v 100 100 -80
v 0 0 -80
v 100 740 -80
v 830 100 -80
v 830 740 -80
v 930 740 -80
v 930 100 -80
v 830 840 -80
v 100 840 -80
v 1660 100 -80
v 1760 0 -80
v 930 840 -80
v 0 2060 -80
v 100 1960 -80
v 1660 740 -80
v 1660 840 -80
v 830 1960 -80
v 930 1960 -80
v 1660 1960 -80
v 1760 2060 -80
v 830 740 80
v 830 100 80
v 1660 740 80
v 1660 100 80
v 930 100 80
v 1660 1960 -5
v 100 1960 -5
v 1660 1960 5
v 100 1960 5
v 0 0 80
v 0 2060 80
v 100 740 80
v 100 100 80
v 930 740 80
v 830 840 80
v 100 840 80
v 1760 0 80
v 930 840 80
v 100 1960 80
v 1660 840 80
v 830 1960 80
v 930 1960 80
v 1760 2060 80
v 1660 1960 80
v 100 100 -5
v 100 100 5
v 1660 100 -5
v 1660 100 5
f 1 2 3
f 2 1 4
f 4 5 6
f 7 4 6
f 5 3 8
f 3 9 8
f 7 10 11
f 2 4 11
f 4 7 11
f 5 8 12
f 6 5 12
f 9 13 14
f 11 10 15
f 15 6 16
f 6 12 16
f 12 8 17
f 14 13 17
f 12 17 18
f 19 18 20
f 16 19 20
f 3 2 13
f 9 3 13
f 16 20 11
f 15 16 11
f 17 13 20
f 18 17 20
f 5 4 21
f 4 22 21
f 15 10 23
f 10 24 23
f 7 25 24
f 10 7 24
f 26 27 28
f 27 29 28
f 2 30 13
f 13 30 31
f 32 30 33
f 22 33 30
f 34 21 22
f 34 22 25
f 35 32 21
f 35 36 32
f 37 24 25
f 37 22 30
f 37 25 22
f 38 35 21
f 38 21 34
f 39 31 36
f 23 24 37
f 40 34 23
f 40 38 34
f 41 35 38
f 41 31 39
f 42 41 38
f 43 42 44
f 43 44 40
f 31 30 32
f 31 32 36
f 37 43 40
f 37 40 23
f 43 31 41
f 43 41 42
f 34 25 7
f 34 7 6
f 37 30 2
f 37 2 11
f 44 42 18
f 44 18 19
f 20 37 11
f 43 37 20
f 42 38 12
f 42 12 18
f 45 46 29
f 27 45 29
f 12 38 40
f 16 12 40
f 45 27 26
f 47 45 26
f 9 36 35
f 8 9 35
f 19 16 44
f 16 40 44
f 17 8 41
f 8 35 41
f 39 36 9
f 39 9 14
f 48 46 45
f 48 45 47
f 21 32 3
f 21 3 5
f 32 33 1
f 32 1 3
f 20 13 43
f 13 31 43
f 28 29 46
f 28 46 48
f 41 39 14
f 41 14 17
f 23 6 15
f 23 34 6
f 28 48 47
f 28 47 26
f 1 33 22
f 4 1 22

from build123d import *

# Parameters (mm, degrees)
SKETCH_1_W      = 1760
SKETCH_1_H      = 2060
SKETCH_1_W_2    = 730
SKETCH_1_H_2    = 1120
SKETCH_1_H_3    = 640
EXTRUDE_1_DEPTH = 80
SKETCH_2_W      = 1560
SKETCH_2_H      = 1860
EXTRUDE_2_DEPTH = 5


with BuildPart() as part:
    # Эскиз1 → Бобышка-Вытянуть1 (new, symmetric)
    with BuildSketch(Plane.XY):
        with Locations((880, 1030)):
            Rectangle(SKETCH_1_W, SKETCH_1_H)
        with Locations((465, 1400)):
            Rectangle(SKETCH_1_W_2, SKETCH_1_H_2, mode=Mode.SUBTRACT)
        with Locations((465, 420)):
            Rectangle(SKETCH_1_W_2, SKETCH_1_H_3, mode=Mode.SUBTRACT)
        with Locations((1295, 1400)):
            Rectangle(SKETCH_1_W_2, SKETCH_1_H_2, mode=Mode.SUBTRACT)
        with Locations((1295, 420)):
            Rectangle(SKETCH_1_W_2, SKETCH_1_H_3, mode=Mode.SUBTRACT)
    extrude(amount=EXTRUDE_1_DEPTH, both=True)


with BuildPart() as body_2:
    # Эскиз2 → Бобышка-Вытянуть2 (new, symmetric)
    with BuildSketch(Plane.XY):
        with Locations((880, 1030)):
            Rectangle(SKETCH_2_W, SKETCH_2_H)
    extrude(amount=EXTRUDE_2_DEPTH, both=True)


solid = Compound([part.part, body_2.part])
